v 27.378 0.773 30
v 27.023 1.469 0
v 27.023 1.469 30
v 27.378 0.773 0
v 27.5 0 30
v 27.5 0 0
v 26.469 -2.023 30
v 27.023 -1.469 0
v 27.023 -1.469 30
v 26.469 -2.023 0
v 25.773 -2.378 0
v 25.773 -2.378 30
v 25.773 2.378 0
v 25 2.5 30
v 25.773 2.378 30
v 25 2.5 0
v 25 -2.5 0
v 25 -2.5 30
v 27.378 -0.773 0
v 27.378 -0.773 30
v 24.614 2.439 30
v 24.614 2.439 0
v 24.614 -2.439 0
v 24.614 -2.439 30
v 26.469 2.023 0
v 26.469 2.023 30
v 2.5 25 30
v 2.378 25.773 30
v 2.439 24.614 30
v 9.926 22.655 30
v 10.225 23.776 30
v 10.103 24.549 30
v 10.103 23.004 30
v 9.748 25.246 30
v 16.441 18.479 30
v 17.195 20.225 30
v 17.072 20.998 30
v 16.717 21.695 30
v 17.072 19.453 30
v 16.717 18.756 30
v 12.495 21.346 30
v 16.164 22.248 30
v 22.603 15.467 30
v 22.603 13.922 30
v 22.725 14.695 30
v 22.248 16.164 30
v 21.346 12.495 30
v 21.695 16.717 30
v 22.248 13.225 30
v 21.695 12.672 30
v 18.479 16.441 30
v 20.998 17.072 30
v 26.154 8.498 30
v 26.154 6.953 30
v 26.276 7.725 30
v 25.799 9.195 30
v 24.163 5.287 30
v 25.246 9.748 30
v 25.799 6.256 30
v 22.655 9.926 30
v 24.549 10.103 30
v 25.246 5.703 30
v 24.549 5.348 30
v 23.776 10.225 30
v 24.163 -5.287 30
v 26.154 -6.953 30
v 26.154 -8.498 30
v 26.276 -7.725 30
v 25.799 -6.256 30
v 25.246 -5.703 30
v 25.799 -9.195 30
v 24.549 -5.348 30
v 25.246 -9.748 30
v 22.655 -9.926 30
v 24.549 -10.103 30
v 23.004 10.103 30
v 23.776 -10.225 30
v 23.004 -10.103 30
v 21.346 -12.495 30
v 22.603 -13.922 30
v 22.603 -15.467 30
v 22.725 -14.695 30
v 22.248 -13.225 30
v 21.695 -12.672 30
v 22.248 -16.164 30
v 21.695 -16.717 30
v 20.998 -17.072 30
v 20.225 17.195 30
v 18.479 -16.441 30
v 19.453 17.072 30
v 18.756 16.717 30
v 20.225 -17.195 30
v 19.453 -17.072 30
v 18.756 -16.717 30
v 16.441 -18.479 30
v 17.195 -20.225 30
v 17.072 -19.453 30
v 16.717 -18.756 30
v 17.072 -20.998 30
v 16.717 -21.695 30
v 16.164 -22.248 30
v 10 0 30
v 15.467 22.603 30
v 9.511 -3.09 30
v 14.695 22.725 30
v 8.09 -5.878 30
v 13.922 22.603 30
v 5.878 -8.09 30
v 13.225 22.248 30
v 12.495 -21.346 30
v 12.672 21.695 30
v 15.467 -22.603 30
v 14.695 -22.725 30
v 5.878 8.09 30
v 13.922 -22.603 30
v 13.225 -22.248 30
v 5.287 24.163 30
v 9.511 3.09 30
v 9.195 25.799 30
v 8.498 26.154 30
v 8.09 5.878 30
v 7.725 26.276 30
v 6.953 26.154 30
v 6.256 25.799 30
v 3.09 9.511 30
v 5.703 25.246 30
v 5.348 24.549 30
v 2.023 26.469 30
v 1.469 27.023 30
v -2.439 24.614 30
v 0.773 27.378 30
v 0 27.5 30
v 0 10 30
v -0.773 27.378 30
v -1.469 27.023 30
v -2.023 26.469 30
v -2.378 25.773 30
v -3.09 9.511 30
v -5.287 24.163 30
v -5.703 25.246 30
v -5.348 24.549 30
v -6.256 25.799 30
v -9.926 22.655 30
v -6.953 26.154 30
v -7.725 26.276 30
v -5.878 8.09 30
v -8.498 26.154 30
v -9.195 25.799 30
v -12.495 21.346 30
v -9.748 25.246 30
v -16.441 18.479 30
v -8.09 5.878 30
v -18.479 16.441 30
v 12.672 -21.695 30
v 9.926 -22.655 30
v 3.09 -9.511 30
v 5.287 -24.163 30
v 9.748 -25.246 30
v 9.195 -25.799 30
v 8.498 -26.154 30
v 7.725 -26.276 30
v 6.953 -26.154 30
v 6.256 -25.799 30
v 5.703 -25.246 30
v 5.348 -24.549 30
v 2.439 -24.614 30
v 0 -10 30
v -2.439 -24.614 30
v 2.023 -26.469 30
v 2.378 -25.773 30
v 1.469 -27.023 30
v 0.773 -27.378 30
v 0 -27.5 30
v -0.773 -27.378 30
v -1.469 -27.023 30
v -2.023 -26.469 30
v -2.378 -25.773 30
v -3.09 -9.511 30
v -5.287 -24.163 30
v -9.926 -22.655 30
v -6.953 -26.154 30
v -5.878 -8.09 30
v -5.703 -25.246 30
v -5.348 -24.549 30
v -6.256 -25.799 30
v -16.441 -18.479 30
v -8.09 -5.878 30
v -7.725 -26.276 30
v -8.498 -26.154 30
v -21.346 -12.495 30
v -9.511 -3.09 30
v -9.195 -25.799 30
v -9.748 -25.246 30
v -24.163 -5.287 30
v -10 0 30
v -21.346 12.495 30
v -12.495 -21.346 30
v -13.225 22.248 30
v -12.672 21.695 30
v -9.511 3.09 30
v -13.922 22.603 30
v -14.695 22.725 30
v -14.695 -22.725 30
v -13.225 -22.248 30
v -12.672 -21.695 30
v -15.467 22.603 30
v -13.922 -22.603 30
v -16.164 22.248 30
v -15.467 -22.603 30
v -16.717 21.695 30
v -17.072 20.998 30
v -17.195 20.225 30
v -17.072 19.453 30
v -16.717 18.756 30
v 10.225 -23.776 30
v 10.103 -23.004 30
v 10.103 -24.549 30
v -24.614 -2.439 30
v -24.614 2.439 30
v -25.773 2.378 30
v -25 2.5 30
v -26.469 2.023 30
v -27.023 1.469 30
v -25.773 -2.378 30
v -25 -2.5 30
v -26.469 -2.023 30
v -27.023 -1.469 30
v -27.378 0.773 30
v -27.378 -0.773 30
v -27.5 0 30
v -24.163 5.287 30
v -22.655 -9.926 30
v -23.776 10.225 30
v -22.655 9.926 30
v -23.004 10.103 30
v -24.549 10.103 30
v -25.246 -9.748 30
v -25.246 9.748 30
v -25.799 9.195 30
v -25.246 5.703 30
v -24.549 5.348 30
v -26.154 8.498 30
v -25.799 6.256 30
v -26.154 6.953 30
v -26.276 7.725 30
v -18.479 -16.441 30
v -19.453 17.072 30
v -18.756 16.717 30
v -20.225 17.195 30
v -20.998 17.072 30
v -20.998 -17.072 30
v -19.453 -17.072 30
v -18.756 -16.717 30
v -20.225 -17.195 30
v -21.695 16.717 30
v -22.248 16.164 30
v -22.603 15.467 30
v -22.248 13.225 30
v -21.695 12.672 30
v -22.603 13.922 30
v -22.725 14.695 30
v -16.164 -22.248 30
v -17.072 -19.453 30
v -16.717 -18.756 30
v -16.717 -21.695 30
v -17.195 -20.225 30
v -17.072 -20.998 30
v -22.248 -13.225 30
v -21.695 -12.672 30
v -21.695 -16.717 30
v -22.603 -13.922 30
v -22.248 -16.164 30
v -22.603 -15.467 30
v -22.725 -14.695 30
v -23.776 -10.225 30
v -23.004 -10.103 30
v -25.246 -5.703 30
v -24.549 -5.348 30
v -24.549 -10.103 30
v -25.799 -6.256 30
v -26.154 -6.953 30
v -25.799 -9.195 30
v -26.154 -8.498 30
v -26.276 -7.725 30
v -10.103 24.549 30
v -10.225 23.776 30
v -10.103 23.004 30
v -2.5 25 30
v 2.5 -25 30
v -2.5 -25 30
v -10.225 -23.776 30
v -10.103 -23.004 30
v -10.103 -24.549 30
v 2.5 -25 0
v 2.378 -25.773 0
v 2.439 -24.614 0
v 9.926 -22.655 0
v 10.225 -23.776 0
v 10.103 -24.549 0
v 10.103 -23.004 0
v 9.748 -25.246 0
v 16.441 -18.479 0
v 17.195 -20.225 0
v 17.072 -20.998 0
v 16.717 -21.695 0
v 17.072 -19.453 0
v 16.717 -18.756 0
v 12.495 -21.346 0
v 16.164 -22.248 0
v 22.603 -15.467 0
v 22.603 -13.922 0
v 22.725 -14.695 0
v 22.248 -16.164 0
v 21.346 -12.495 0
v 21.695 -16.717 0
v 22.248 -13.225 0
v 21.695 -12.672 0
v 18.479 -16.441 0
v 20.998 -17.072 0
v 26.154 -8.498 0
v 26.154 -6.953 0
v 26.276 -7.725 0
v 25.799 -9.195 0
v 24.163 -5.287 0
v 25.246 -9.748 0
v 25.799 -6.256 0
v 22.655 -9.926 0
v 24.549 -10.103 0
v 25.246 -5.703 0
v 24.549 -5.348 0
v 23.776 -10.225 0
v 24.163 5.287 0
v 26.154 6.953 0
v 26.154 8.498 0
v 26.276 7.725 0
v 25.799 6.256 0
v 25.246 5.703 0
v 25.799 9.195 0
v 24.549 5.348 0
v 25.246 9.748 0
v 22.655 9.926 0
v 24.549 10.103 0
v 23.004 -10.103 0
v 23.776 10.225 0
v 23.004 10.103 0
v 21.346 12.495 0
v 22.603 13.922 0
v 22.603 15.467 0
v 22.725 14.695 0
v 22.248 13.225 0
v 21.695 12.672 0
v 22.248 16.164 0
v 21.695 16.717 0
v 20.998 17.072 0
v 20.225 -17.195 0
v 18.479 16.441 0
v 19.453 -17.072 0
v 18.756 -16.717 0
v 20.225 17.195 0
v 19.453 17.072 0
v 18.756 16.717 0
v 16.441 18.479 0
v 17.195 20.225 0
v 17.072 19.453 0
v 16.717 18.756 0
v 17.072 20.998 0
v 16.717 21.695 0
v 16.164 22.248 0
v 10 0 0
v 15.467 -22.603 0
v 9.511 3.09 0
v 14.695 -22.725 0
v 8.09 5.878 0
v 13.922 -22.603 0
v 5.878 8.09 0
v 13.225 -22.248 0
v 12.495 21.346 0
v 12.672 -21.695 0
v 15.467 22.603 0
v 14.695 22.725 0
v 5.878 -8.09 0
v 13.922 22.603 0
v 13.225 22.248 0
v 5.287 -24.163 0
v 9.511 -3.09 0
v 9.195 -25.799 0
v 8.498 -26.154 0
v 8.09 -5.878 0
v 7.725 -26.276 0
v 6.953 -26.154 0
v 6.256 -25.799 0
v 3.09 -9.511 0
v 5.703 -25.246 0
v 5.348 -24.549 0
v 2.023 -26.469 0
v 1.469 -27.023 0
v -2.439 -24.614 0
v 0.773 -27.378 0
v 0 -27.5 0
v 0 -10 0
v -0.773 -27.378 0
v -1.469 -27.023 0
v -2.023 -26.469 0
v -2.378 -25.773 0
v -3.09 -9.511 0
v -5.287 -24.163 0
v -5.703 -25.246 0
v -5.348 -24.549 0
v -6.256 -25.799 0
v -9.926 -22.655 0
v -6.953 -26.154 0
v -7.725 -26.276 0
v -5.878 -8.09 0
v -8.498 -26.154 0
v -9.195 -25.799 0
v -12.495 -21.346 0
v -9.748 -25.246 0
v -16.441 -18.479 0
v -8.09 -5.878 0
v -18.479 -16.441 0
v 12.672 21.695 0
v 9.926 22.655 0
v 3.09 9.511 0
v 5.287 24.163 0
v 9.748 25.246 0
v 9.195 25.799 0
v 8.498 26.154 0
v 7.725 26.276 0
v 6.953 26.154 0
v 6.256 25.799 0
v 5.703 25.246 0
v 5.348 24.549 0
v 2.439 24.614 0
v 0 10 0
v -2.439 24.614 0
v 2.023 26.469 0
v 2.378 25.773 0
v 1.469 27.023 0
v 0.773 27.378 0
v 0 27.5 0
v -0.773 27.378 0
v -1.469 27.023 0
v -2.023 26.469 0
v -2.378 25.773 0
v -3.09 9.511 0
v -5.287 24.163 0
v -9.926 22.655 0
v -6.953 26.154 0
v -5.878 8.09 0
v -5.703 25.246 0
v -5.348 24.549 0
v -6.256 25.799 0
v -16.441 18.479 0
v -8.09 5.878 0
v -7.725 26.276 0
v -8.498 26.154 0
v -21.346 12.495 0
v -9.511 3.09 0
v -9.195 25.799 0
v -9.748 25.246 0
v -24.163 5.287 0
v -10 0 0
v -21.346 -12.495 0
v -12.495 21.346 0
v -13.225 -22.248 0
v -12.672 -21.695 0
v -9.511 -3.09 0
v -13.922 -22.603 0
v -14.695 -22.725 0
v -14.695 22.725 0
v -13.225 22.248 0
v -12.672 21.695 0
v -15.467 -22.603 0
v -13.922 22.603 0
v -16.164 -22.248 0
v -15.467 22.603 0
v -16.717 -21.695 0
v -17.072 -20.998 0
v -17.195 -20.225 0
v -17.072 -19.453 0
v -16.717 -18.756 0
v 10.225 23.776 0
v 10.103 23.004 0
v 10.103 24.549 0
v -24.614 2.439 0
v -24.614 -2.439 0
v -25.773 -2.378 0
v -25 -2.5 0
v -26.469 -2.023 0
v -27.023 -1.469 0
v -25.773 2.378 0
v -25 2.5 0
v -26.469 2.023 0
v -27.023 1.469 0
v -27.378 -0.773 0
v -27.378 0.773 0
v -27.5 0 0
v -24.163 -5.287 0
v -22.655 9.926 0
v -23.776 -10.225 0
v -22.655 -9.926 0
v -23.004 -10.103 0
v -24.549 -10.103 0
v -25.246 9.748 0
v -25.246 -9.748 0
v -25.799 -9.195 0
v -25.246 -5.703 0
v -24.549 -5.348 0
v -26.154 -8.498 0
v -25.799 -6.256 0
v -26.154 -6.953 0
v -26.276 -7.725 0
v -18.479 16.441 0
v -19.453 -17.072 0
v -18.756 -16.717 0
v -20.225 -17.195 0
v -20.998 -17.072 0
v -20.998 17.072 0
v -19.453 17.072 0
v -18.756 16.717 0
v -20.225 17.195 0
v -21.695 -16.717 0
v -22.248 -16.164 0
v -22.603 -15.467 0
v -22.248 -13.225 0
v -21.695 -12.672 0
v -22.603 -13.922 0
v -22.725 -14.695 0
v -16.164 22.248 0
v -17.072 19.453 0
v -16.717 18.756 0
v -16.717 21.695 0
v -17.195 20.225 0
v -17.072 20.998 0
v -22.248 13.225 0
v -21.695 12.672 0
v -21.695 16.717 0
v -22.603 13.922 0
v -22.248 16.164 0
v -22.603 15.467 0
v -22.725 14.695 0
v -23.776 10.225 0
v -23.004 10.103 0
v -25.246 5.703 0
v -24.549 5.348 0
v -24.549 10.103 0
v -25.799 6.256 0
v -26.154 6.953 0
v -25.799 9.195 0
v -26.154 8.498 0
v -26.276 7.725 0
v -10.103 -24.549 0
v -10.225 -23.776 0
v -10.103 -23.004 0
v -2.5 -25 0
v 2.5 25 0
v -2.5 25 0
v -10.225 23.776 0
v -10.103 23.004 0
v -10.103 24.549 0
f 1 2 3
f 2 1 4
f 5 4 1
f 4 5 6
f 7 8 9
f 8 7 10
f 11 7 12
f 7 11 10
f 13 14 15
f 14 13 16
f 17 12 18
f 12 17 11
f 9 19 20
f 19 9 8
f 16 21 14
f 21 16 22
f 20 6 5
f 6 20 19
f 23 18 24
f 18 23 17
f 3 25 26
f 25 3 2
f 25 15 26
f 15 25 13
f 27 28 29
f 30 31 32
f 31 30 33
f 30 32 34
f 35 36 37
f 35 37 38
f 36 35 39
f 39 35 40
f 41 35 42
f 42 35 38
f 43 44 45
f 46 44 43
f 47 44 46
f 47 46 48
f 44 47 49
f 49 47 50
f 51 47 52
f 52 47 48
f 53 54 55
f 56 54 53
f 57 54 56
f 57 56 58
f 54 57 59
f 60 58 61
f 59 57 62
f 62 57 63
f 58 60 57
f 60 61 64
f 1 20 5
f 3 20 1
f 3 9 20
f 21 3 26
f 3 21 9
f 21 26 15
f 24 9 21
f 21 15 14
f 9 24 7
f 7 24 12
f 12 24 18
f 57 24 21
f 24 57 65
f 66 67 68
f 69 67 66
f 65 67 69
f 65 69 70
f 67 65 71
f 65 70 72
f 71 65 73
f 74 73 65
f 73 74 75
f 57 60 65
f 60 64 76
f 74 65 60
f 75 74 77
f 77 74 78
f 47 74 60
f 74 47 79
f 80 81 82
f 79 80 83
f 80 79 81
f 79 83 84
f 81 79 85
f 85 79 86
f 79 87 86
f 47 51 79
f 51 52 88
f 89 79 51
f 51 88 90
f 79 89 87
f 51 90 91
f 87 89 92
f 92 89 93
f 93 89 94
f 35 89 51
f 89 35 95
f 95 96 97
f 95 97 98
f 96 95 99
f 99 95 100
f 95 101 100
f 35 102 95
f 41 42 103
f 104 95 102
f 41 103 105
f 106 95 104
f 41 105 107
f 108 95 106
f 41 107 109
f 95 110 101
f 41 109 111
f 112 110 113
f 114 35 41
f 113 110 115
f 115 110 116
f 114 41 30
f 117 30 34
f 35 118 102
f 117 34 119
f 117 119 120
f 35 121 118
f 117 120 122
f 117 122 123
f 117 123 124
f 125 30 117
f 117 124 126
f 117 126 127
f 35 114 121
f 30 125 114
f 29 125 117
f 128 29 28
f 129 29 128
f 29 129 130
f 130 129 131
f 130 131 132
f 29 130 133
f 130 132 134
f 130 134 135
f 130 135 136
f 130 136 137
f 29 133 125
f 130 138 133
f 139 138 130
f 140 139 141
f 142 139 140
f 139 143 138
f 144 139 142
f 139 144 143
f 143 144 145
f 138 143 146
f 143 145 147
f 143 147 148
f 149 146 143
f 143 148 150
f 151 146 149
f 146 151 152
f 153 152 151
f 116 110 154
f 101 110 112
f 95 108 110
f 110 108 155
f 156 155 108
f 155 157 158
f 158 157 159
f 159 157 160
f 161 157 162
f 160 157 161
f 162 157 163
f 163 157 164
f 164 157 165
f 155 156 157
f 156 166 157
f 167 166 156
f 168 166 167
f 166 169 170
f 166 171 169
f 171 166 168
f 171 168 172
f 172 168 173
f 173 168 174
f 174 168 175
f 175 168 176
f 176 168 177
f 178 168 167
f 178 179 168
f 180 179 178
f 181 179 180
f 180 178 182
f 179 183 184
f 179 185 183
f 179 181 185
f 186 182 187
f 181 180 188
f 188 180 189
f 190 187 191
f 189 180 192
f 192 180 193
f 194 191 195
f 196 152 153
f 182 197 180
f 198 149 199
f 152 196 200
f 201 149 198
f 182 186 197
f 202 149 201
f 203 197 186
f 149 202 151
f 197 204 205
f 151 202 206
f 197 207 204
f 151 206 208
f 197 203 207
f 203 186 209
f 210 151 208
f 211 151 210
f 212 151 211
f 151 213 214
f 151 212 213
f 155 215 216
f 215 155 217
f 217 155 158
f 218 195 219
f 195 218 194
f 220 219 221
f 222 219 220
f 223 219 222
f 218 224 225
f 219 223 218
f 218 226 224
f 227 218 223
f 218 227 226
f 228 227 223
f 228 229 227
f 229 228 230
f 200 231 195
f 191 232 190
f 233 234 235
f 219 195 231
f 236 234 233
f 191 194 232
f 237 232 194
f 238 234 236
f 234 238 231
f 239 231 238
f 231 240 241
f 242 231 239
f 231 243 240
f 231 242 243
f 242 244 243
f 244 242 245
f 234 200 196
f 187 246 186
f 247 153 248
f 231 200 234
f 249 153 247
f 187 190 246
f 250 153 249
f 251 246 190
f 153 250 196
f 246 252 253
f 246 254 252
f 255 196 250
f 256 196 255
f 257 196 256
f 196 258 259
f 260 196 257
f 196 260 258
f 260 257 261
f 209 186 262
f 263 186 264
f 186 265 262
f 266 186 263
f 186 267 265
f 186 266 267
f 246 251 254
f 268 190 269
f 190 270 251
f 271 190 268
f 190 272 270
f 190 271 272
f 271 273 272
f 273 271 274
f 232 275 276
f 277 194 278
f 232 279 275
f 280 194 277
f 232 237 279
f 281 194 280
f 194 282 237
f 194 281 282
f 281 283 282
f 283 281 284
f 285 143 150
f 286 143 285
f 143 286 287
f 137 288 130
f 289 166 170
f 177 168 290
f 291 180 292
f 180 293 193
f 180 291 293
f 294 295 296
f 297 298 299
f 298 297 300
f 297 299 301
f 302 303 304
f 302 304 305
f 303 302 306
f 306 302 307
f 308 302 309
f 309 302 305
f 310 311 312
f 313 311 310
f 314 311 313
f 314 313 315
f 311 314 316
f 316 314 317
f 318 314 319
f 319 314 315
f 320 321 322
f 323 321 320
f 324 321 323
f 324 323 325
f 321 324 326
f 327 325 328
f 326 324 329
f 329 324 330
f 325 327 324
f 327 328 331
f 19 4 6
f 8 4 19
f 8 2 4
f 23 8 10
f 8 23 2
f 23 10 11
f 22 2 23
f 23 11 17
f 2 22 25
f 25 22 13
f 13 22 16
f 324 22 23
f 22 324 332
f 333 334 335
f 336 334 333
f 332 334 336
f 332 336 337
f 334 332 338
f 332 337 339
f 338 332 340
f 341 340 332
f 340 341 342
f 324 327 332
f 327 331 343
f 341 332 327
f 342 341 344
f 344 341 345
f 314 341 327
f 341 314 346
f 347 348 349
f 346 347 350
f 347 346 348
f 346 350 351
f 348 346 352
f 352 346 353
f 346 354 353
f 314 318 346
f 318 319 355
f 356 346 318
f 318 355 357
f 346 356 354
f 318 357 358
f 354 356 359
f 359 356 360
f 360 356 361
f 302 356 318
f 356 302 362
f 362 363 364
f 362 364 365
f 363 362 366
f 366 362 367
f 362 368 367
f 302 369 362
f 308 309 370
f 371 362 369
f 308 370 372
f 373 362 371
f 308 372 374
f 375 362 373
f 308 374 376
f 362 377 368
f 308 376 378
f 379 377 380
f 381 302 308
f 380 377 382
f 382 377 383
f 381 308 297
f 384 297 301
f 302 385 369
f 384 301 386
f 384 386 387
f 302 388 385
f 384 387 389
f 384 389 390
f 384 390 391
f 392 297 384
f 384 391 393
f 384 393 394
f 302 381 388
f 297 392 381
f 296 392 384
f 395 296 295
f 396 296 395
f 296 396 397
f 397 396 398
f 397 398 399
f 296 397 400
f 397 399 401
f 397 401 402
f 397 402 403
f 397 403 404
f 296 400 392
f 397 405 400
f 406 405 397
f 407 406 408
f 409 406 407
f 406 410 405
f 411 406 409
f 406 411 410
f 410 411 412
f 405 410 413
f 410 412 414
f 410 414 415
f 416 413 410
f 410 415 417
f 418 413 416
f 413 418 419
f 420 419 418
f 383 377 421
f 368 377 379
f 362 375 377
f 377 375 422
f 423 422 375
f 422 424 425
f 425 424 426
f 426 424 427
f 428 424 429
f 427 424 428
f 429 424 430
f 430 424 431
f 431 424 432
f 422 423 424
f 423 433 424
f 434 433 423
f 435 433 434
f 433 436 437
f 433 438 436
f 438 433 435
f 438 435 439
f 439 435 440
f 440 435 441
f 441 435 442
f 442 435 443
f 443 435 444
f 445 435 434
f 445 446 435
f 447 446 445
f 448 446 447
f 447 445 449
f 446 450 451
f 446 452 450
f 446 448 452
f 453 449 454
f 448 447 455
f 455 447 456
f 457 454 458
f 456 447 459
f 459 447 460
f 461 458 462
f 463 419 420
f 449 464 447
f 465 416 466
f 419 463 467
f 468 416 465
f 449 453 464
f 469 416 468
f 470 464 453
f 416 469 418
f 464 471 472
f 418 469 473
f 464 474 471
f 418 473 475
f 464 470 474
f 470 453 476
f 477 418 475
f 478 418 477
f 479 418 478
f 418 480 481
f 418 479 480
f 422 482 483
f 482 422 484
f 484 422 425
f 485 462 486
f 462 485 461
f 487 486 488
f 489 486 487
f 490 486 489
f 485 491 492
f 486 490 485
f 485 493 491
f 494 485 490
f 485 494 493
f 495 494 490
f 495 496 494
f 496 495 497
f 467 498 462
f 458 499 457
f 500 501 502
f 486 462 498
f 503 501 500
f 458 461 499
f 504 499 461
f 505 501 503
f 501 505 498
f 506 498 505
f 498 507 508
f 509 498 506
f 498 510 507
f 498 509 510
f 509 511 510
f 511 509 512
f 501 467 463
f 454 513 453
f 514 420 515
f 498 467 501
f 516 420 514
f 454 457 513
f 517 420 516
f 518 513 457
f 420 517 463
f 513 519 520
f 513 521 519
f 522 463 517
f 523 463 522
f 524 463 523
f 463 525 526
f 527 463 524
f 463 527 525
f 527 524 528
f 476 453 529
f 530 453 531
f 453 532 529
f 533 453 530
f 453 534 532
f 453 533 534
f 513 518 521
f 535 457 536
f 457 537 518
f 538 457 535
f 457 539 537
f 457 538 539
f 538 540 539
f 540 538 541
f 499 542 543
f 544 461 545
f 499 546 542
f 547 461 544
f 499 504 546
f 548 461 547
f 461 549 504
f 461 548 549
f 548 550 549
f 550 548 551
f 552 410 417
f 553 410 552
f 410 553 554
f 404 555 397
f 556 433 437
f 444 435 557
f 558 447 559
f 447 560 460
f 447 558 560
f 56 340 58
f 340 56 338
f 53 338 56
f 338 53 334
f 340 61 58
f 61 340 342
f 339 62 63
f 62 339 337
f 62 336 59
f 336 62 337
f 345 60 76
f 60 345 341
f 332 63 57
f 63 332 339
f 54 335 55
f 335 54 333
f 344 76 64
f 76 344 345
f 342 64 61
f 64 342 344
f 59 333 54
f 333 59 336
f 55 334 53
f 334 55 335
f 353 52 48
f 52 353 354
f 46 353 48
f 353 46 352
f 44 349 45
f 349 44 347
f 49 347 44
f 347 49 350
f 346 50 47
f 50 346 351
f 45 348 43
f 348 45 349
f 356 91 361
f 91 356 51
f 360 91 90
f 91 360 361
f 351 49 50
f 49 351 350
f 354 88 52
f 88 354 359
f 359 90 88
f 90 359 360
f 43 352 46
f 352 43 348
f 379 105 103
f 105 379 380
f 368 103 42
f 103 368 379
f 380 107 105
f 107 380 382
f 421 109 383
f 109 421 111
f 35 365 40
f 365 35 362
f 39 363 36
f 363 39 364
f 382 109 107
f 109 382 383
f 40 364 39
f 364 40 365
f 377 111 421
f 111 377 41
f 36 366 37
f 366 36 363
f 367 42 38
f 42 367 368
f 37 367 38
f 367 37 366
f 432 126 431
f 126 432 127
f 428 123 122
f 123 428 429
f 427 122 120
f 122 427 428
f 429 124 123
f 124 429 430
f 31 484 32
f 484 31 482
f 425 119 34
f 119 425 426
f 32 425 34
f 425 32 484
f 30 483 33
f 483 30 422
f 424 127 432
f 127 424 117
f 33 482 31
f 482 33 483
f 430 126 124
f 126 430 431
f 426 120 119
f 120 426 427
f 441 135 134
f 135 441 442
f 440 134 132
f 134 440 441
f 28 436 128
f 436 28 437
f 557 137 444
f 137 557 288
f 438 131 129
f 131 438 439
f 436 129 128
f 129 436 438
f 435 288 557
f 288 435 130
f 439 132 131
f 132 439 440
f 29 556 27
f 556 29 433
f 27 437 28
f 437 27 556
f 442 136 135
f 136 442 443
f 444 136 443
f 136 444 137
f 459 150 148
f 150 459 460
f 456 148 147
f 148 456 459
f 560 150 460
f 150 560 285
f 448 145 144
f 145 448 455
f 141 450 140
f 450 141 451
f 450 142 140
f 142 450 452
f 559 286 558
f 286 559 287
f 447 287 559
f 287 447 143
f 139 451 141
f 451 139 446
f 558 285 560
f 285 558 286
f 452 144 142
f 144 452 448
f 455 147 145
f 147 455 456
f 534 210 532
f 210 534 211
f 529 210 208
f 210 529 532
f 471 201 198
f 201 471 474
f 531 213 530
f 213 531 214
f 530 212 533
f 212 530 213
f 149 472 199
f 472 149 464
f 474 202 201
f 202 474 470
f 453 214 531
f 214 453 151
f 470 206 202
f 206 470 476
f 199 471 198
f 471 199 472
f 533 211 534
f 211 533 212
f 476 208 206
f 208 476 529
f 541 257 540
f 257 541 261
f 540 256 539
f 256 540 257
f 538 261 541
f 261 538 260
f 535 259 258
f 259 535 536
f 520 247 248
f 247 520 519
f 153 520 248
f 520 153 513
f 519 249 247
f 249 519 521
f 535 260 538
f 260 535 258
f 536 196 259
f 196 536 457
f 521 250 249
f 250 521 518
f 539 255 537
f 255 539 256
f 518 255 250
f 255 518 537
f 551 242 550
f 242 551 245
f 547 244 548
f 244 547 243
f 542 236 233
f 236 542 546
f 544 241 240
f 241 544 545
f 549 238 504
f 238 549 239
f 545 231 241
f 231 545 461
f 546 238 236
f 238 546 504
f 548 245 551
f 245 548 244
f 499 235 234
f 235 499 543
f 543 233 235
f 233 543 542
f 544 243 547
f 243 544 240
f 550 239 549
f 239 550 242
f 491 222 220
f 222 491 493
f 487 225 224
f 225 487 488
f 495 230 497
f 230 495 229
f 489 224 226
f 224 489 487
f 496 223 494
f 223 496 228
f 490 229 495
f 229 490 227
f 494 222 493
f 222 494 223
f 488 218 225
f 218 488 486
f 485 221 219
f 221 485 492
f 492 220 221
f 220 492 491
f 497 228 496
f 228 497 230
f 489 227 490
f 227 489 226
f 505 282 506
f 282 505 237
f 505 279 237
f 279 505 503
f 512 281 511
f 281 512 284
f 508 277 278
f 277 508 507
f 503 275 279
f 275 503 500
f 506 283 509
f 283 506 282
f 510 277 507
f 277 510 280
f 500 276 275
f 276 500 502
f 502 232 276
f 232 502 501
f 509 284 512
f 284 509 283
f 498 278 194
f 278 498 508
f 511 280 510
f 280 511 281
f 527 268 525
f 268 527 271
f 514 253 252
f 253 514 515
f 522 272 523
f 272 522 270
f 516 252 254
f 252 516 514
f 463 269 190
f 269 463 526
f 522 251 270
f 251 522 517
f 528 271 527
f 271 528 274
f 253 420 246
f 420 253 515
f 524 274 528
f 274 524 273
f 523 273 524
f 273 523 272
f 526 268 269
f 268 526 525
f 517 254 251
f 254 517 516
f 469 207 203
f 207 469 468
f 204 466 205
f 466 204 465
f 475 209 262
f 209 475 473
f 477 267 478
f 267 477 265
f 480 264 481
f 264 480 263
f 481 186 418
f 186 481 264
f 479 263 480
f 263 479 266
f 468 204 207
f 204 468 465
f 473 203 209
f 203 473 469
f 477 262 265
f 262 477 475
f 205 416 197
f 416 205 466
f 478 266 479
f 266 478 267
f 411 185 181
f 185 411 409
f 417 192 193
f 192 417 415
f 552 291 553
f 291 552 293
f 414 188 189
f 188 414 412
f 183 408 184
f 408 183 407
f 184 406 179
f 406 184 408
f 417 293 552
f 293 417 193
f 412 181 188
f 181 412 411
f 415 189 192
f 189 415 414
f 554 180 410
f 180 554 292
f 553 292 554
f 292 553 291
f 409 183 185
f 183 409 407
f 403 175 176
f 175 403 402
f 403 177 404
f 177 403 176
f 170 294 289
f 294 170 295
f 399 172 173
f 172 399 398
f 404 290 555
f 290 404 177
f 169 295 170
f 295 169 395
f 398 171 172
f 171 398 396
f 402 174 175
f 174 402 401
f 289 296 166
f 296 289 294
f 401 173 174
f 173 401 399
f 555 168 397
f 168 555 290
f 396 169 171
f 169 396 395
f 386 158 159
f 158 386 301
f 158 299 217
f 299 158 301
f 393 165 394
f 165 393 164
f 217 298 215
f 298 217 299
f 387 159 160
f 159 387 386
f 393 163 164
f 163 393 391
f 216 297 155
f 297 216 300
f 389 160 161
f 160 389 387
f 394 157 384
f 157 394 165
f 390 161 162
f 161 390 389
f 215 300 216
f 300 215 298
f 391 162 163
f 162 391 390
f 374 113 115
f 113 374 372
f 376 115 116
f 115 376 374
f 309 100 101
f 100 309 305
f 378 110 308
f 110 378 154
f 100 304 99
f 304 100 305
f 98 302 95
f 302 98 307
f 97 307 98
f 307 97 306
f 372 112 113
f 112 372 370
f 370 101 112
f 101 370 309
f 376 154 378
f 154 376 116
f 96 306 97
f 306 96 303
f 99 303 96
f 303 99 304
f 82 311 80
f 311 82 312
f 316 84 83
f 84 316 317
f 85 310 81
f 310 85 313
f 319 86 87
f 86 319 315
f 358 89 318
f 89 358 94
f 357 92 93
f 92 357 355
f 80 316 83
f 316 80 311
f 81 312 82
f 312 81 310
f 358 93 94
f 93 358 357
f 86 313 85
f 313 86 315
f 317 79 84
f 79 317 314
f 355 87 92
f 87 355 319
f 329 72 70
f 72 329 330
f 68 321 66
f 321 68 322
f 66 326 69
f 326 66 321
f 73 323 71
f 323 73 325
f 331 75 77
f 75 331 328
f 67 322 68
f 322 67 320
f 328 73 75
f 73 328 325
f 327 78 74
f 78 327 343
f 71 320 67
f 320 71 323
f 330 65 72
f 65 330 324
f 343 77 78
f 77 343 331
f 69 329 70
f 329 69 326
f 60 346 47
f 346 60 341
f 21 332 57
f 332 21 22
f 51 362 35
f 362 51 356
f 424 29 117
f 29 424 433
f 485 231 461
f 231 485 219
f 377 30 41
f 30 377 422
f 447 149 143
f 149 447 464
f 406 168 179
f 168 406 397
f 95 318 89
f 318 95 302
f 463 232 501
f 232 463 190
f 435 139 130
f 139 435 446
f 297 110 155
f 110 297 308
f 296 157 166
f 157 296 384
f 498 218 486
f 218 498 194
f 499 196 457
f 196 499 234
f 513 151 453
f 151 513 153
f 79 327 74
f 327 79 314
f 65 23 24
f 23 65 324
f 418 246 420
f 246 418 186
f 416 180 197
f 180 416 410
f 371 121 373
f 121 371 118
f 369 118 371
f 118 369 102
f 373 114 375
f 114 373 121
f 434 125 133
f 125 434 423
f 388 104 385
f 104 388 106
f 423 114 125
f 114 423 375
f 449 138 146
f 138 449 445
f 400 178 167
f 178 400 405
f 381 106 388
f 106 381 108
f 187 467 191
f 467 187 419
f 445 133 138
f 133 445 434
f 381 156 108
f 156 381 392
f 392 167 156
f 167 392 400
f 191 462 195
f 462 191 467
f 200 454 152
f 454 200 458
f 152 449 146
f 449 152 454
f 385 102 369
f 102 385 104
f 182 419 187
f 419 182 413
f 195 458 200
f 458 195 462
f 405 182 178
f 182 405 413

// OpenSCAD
$fn = 20;


// variables
xObj_radius=25;
xObj_height=30;
xObj_gears=20;

xObj_gear_length=0;
xObj_gear_width=5;
xObj_gear_height=1;

xObj_hole_radius=10;


module xObj()
{
	difference()
	{
		union()		// Main piece
		{
			cylinder(r=xObj_radius, h=xObj_height);
			
			for(r=[0:xObj_gears])
			{
				rotate( [0,0,r*360/xObj_gears] )
				{
					translate(	[xObj_radius, 0, xObj_height/2] )
						cube( 
	[2*xObj_gear_length,
	xObj_gear_width
	,xObj_height*xObj_gear_height],
	center=true);
					translate(	[xObj_radius + xObj_gear_length, 0, xObj_height/2] )
						cylinder(
	r=xObj_gear_width/2,
	h=xObj_height*xObj_gear_height,
	center=true);
				}
			}


		}


		union()		// Pieces to remove
		{
			cylinder(r=xObj_hole_radius, h=xObj_height);
		}
	}
}




xObj();
